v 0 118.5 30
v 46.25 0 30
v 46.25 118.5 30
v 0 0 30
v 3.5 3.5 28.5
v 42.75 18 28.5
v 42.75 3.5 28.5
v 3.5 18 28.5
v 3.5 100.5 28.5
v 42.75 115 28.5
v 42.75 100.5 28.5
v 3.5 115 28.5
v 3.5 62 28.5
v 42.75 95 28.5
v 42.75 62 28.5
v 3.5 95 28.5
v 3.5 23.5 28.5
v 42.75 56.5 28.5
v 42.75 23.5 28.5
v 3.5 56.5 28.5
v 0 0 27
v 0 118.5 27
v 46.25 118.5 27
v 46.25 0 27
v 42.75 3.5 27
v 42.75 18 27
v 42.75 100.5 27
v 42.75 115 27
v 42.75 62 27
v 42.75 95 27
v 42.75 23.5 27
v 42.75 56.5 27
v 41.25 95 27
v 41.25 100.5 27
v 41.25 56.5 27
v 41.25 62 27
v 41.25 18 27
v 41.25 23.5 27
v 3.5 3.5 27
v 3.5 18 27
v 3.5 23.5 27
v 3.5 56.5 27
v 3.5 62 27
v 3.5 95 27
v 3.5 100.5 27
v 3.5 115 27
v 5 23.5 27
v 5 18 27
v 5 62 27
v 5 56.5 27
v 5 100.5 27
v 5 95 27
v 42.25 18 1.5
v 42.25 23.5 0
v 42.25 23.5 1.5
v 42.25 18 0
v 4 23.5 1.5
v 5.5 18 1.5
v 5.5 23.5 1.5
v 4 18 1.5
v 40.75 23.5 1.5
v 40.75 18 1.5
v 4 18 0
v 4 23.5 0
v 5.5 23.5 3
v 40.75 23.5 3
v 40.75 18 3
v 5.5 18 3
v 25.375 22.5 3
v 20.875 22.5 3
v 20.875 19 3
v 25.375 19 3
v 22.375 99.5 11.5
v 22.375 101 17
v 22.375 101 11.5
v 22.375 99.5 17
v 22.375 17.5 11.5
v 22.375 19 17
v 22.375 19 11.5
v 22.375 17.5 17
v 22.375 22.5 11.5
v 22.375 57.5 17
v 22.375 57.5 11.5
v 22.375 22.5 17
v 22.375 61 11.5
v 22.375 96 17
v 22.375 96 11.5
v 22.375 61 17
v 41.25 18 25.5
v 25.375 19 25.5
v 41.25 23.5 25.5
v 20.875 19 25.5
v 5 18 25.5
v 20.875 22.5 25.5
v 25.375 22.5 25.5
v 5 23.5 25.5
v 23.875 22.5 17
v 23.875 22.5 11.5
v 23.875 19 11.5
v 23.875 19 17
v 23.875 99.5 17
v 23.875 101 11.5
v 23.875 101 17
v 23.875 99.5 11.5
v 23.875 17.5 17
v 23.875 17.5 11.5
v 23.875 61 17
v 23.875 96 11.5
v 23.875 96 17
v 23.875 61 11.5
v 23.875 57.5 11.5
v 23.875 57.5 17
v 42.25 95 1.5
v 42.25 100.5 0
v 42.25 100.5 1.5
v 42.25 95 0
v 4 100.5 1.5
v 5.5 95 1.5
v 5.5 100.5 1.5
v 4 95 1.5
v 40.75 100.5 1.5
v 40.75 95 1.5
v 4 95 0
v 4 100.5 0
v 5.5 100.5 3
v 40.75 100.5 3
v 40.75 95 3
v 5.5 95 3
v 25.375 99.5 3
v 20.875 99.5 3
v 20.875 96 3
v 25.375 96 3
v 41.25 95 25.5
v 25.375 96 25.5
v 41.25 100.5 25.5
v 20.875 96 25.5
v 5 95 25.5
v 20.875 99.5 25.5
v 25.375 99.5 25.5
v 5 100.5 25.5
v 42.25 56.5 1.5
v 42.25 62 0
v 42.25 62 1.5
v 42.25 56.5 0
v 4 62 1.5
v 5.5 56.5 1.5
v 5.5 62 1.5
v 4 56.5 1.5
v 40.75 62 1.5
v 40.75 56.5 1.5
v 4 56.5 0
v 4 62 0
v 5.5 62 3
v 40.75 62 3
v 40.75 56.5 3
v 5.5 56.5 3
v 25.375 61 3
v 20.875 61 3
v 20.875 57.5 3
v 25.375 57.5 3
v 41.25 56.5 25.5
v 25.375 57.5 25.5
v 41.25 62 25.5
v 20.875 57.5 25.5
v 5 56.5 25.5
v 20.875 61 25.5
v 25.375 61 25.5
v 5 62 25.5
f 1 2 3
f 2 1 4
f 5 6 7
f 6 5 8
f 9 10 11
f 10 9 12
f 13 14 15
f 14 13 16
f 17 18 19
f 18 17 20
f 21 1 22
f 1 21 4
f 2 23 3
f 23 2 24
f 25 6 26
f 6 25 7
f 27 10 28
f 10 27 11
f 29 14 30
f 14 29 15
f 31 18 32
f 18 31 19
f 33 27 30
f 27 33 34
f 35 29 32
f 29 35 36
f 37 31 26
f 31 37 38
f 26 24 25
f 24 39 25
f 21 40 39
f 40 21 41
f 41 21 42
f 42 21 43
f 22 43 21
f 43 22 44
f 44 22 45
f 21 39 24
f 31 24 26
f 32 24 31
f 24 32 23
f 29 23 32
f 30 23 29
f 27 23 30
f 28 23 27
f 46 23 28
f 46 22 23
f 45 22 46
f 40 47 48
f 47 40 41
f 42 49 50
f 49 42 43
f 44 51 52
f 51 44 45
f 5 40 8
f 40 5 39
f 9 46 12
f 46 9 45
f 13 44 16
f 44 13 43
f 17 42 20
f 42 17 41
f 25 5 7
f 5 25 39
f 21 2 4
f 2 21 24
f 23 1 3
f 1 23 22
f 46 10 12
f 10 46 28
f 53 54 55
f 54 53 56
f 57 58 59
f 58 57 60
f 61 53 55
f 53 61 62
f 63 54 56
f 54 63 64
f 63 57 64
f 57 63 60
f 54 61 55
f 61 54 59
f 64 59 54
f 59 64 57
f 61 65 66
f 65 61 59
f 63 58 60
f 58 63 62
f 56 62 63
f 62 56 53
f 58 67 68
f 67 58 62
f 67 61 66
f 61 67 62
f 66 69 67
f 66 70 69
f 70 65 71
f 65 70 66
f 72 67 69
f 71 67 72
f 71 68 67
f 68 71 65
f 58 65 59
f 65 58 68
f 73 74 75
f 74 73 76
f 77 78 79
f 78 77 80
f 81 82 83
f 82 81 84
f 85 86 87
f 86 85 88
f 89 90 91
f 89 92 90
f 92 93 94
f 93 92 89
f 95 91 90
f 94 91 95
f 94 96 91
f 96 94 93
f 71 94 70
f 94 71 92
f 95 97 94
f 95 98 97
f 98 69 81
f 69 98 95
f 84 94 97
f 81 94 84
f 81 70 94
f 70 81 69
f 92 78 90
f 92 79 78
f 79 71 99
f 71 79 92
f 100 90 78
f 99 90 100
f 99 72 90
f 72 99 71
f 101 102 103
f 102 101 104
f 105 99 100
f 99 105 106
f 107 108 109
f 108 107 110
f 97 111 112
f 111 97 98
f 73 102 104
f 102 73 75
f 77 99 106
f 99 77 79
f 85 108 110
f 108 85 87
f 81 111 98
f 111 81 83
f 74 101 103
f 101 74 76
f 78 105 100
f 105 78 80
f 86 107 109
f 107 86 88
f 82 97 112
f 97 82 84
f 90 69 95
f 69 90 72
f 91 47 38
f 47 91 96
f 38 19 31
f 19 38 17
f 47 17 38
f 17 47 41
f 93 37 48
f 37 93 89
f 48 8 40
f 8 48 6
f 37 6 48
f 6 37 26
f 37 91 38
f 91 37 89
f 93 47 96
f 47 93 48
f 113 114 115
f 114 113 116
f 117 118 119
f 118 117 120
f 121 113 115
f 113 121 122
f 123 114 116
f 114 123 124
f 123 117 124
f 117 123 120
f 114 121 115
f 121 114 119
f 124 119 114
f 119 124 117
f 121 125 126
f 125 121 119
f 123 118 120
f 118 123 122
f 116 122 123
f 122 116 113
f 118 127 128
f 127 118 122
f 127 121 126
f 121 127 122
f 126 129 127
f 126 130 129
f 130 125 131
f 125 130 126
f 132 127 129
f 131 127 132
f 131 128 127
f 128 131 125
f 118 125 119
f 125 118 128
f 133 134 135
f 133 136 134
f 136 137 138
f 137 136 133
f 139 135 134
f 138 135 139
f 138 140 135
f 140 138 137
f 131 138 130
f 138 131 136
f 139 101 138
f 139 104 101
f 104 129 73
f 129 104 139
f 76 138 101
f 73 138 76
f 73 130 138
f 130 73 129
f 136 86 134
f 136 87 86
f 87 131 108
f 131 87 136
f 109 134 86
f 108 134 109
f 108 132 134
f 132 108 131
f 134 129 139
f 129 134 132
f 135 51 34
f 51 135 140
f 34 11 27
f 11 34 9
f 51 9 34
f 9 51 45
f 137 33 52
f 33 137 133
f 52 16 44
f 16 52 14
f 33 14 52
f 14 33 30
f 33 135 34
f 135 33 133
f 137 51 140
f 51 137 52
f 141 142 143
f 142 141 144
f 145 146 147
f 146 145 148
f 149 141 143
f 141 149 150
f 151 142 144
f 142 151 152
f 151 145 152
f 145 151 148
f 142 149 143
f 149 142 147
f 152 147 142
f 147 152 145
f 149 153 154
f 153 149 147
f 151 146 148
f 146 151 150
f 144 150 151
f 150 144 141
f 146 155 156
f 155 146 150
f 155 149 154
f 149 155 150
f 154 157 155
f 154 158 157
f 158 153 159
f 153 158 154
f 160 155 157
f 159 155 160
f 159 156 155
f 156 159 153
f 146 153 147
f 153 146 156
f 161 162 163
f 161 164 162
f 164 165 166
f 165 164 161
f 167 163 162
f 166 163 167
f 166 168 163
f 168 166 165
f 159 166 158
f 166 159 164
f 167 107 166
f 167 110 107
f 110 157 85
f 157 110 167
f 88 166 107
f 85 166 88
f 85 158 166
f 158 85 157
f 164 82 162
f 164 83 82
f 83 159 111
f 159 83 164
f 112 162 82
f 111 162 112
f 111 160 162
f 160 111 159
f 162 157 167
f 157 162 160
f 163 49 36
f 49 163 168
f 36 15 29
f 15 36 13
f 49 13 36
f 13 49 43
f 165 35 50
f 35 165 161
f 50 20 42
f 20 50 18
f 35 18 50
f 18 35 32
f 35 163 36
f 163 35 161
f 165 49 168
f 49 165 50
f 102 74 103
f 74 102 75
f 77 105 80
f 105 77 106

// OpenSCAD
t_height = 30;
plank_w = 9.25;
num_planks = 5;
t_width = num_planks * plank_w;
end_w = 11.25;
end_l = t_width;
plank_l = 96;
t_length = plank_l + end_w*2;

echo("Total Length: ", t_length);
echo("Total Width:  ", t_width);
top_thickness = 1.5;
top_height = t_height - top_thickness;
l2_height = top_height - top_thickness;

l2_w = 3.5;
l2_end_l = end_l - (l2_w * 2);
l2_l = t_length;


translate ([0, 0, top_height]) cube([end_l, end_w, top_thickness]);
translate ([0, t_length-end_w, top_height]) cube([end_l, end_w, top_thickness]);

for(i = [0 : num_planks-1]) {
    translate([i * plank_w, end_w, top_height]) cube([plank_w, plank_l, top_thickness]);
}


// second layer
color( "red", 1) {
     translate ([l2_w, 0, l2_height]) cube([l2_end_l, l2_w, top_thickness]);
     translate ([l2_w, t_length-l2_w, l2_height]) cube([l2_end_l, l2_w, top_thickness]);

     translate([0, 0, l2_height]) cube([l2_w, l2_l, top_thickness]);
     translate([t_width - l2_w, 0, l2_height]) cube([l2_w, l2_l, top_thickness]);
}

// leg
overhang_amnt = 4;
base_w = t_width - (overhang_amnt * 2);
end_overhang = 18;

module pedestal (bot_w, top_w, height, board_w) {
     board_thck = 1.5;
     f5run = board_thck / tan(45); // horizontal dist of 45 degree cut in board_thck wood
     post_w = 3.5;
     echo("THEIGHT INSIDE: ", t_height);
     // assume top longer than bot
     width_diff = top_w - bot_w;
     echo("width_diff: ", width_diff);
     offset = width_diff / 2;

     // bottom bits
     translate([offset, 0, 0]) cube([bot_w, board_w, board_thck]);
     translate([offset+f5run, 0, board_thck]) cube([bot_w - (f5run*2), board_w, board_thck]);

     post_dist = (top_w - (board_thck * 3)) / 2;
     post_y_offset = (board_w - post_w)/2;
     post_z_offset = board_thck*2;
     post_height = (height - board_thck * 4);
     midpost_height = (post_height - board_w) / 2;

     // post
     translate([post_dist, post_y_offset, post_z_offset]) cube([board_thck, post_w, post_height]);
     translate([post_dist + board_thck, post_y_offset, post_z_offset]) cube([board_thck, post_w, midpost_height]);
     translate([post_dist + board_thck, post_y_offset, post_z_offset + midpost_height + board_w]) cube([board_thck, post_w, midpost_height]);
     translate([post_dist + (board_thck*2), post_y_offset, post_z_offset]) cube([board_thck, post_w, post_height]);

     // top bits
     translate([0, 0, height-board_thck]) cube([top_w, board_w, board_thck]);
     translate([f5run, 0, height-(board_thck*2)]) cube([top_w-(f5run*2), board_w, board_thck]);
}

color("green", 1) {
     board_w = 5.5;
     translate([l2_w, end_overhang, 0]) pedestal(base_w, l2_end_l, top_height, board_w);
     translate([l2_w, t_length-end_overhang-5.5, 0]) pedestal(base_w, l2_end_l, top_height, board_w);
     translate([l2_w, (t_length-5.5)/2, 0]) pedestal(base_w, l2_end_l, top_height, board_w);
}

color("purple", 1) {
     height = top_height;
     board_w = 5.5;
     board_thck = 1.5;
     post_z_offset = board_thck*2;
     post_height = (height - board_thck * 4);
     midpost_height = (post_height - board_w) / 2;
     translate([(t_width-1.5)/2, end_overhang-0.5, post_z_offset+midpost_height]) cube([board_thck, (t_length+1) - (end_overhang*2), 5.5]);
}


//
//module stud (length, rot) {
//    rotate(rot) cube([1.5, 3.5, length]);
//}
//
//// front uprights
//stud(height); // cube([1.5,3.5,height]);    
//translate([shelf_width + 1.5, 0]) stud(height);
//translate([frame_width, 0]) stud(height, [0,0,90]);
//
//// rear uprights
//translate([0, depth-3.5]) stud(height);
//translate([shelf_width + 1.5, depth-3.5]) stud(height);
//translate([frame_width, depth-1.5]) stud(height, [0,0,90]);
//
//
//
//// shelf flats
//translate([1.5, 0, floor_clearance+2]) stud(shelf_width, [0, 90, 0]); //cube([shelf_width, 3.5, 1.5]);
//translate([1.5, depth-3.5, floor_clearance+2]) cube([shelf_width, 3.5, 1.5]);
//
//translate([1.5, 0, mid_height]) cube([shelf_width, 3.5, 1.5]);
//translate([1.5, depth-3.5, mid_height]) cube([shelf_width, 3.5, 1.5]);
//
//translate([1.5, 0, height-1.5]) cube([shelf_width, 3.5, 1.5]);
//translate([1.5, depth-3.5, height-1.5]) cube([shelf_width, 3.5, 1.5]);
//
//
//// shelf depth supports
////   bottom
//translate([0, 3.5, floor_clearance]) cube([1.5, depth-7, 3.5]);
//translate([shelf_width+1.5, 3.5, floor_clearance]) cube([1.5, depth-7, 3.5]);
//
////   middle
//translate([0, 3.5, mid_height-2]) cube([1.5, depth-7, 3.5]);
//translate([shelf_width+1.5, 3.5, mid_height-2]) cube([1.5, depth-7, 3.5]);
//
////   top
//translate([0, 3.5, height-3.5]) cube([1.5, depth-7, 3.5]);
//translate([shelf_width+1.5, 3.5, height-3.5]) cube([1.5, depth-7, 3.5]);
//
//// right side depth supports
//translate([frame_width-1.5, 1.5, floor_clearance]) cube([1.5, depth-3, 3.5]);
//translate([frame_width-1.5, 1.5, height-3.5]) cube([1.5, depth-3, 3.5]);
//
//
//// crossbeams
////   front bottom
//translate([shelf_width+3, 0, floor_clearance]) cube([main_width, 1.5, 3.5]); 
////   front top
//translate([shelf_width+3, 0, height-3.5]) cube([main_width, 1.5, 3.5]); 
////   back bottom
//translate([shelf_width+3, depth-1.5, floor_clearance]) cube([main_width, 1.5, 3.5]); 
////   back top
//translate([shelf_width+3, depth-1.5, height-3.5]) cube([main_width, 1.5, 3.5]); 
//
